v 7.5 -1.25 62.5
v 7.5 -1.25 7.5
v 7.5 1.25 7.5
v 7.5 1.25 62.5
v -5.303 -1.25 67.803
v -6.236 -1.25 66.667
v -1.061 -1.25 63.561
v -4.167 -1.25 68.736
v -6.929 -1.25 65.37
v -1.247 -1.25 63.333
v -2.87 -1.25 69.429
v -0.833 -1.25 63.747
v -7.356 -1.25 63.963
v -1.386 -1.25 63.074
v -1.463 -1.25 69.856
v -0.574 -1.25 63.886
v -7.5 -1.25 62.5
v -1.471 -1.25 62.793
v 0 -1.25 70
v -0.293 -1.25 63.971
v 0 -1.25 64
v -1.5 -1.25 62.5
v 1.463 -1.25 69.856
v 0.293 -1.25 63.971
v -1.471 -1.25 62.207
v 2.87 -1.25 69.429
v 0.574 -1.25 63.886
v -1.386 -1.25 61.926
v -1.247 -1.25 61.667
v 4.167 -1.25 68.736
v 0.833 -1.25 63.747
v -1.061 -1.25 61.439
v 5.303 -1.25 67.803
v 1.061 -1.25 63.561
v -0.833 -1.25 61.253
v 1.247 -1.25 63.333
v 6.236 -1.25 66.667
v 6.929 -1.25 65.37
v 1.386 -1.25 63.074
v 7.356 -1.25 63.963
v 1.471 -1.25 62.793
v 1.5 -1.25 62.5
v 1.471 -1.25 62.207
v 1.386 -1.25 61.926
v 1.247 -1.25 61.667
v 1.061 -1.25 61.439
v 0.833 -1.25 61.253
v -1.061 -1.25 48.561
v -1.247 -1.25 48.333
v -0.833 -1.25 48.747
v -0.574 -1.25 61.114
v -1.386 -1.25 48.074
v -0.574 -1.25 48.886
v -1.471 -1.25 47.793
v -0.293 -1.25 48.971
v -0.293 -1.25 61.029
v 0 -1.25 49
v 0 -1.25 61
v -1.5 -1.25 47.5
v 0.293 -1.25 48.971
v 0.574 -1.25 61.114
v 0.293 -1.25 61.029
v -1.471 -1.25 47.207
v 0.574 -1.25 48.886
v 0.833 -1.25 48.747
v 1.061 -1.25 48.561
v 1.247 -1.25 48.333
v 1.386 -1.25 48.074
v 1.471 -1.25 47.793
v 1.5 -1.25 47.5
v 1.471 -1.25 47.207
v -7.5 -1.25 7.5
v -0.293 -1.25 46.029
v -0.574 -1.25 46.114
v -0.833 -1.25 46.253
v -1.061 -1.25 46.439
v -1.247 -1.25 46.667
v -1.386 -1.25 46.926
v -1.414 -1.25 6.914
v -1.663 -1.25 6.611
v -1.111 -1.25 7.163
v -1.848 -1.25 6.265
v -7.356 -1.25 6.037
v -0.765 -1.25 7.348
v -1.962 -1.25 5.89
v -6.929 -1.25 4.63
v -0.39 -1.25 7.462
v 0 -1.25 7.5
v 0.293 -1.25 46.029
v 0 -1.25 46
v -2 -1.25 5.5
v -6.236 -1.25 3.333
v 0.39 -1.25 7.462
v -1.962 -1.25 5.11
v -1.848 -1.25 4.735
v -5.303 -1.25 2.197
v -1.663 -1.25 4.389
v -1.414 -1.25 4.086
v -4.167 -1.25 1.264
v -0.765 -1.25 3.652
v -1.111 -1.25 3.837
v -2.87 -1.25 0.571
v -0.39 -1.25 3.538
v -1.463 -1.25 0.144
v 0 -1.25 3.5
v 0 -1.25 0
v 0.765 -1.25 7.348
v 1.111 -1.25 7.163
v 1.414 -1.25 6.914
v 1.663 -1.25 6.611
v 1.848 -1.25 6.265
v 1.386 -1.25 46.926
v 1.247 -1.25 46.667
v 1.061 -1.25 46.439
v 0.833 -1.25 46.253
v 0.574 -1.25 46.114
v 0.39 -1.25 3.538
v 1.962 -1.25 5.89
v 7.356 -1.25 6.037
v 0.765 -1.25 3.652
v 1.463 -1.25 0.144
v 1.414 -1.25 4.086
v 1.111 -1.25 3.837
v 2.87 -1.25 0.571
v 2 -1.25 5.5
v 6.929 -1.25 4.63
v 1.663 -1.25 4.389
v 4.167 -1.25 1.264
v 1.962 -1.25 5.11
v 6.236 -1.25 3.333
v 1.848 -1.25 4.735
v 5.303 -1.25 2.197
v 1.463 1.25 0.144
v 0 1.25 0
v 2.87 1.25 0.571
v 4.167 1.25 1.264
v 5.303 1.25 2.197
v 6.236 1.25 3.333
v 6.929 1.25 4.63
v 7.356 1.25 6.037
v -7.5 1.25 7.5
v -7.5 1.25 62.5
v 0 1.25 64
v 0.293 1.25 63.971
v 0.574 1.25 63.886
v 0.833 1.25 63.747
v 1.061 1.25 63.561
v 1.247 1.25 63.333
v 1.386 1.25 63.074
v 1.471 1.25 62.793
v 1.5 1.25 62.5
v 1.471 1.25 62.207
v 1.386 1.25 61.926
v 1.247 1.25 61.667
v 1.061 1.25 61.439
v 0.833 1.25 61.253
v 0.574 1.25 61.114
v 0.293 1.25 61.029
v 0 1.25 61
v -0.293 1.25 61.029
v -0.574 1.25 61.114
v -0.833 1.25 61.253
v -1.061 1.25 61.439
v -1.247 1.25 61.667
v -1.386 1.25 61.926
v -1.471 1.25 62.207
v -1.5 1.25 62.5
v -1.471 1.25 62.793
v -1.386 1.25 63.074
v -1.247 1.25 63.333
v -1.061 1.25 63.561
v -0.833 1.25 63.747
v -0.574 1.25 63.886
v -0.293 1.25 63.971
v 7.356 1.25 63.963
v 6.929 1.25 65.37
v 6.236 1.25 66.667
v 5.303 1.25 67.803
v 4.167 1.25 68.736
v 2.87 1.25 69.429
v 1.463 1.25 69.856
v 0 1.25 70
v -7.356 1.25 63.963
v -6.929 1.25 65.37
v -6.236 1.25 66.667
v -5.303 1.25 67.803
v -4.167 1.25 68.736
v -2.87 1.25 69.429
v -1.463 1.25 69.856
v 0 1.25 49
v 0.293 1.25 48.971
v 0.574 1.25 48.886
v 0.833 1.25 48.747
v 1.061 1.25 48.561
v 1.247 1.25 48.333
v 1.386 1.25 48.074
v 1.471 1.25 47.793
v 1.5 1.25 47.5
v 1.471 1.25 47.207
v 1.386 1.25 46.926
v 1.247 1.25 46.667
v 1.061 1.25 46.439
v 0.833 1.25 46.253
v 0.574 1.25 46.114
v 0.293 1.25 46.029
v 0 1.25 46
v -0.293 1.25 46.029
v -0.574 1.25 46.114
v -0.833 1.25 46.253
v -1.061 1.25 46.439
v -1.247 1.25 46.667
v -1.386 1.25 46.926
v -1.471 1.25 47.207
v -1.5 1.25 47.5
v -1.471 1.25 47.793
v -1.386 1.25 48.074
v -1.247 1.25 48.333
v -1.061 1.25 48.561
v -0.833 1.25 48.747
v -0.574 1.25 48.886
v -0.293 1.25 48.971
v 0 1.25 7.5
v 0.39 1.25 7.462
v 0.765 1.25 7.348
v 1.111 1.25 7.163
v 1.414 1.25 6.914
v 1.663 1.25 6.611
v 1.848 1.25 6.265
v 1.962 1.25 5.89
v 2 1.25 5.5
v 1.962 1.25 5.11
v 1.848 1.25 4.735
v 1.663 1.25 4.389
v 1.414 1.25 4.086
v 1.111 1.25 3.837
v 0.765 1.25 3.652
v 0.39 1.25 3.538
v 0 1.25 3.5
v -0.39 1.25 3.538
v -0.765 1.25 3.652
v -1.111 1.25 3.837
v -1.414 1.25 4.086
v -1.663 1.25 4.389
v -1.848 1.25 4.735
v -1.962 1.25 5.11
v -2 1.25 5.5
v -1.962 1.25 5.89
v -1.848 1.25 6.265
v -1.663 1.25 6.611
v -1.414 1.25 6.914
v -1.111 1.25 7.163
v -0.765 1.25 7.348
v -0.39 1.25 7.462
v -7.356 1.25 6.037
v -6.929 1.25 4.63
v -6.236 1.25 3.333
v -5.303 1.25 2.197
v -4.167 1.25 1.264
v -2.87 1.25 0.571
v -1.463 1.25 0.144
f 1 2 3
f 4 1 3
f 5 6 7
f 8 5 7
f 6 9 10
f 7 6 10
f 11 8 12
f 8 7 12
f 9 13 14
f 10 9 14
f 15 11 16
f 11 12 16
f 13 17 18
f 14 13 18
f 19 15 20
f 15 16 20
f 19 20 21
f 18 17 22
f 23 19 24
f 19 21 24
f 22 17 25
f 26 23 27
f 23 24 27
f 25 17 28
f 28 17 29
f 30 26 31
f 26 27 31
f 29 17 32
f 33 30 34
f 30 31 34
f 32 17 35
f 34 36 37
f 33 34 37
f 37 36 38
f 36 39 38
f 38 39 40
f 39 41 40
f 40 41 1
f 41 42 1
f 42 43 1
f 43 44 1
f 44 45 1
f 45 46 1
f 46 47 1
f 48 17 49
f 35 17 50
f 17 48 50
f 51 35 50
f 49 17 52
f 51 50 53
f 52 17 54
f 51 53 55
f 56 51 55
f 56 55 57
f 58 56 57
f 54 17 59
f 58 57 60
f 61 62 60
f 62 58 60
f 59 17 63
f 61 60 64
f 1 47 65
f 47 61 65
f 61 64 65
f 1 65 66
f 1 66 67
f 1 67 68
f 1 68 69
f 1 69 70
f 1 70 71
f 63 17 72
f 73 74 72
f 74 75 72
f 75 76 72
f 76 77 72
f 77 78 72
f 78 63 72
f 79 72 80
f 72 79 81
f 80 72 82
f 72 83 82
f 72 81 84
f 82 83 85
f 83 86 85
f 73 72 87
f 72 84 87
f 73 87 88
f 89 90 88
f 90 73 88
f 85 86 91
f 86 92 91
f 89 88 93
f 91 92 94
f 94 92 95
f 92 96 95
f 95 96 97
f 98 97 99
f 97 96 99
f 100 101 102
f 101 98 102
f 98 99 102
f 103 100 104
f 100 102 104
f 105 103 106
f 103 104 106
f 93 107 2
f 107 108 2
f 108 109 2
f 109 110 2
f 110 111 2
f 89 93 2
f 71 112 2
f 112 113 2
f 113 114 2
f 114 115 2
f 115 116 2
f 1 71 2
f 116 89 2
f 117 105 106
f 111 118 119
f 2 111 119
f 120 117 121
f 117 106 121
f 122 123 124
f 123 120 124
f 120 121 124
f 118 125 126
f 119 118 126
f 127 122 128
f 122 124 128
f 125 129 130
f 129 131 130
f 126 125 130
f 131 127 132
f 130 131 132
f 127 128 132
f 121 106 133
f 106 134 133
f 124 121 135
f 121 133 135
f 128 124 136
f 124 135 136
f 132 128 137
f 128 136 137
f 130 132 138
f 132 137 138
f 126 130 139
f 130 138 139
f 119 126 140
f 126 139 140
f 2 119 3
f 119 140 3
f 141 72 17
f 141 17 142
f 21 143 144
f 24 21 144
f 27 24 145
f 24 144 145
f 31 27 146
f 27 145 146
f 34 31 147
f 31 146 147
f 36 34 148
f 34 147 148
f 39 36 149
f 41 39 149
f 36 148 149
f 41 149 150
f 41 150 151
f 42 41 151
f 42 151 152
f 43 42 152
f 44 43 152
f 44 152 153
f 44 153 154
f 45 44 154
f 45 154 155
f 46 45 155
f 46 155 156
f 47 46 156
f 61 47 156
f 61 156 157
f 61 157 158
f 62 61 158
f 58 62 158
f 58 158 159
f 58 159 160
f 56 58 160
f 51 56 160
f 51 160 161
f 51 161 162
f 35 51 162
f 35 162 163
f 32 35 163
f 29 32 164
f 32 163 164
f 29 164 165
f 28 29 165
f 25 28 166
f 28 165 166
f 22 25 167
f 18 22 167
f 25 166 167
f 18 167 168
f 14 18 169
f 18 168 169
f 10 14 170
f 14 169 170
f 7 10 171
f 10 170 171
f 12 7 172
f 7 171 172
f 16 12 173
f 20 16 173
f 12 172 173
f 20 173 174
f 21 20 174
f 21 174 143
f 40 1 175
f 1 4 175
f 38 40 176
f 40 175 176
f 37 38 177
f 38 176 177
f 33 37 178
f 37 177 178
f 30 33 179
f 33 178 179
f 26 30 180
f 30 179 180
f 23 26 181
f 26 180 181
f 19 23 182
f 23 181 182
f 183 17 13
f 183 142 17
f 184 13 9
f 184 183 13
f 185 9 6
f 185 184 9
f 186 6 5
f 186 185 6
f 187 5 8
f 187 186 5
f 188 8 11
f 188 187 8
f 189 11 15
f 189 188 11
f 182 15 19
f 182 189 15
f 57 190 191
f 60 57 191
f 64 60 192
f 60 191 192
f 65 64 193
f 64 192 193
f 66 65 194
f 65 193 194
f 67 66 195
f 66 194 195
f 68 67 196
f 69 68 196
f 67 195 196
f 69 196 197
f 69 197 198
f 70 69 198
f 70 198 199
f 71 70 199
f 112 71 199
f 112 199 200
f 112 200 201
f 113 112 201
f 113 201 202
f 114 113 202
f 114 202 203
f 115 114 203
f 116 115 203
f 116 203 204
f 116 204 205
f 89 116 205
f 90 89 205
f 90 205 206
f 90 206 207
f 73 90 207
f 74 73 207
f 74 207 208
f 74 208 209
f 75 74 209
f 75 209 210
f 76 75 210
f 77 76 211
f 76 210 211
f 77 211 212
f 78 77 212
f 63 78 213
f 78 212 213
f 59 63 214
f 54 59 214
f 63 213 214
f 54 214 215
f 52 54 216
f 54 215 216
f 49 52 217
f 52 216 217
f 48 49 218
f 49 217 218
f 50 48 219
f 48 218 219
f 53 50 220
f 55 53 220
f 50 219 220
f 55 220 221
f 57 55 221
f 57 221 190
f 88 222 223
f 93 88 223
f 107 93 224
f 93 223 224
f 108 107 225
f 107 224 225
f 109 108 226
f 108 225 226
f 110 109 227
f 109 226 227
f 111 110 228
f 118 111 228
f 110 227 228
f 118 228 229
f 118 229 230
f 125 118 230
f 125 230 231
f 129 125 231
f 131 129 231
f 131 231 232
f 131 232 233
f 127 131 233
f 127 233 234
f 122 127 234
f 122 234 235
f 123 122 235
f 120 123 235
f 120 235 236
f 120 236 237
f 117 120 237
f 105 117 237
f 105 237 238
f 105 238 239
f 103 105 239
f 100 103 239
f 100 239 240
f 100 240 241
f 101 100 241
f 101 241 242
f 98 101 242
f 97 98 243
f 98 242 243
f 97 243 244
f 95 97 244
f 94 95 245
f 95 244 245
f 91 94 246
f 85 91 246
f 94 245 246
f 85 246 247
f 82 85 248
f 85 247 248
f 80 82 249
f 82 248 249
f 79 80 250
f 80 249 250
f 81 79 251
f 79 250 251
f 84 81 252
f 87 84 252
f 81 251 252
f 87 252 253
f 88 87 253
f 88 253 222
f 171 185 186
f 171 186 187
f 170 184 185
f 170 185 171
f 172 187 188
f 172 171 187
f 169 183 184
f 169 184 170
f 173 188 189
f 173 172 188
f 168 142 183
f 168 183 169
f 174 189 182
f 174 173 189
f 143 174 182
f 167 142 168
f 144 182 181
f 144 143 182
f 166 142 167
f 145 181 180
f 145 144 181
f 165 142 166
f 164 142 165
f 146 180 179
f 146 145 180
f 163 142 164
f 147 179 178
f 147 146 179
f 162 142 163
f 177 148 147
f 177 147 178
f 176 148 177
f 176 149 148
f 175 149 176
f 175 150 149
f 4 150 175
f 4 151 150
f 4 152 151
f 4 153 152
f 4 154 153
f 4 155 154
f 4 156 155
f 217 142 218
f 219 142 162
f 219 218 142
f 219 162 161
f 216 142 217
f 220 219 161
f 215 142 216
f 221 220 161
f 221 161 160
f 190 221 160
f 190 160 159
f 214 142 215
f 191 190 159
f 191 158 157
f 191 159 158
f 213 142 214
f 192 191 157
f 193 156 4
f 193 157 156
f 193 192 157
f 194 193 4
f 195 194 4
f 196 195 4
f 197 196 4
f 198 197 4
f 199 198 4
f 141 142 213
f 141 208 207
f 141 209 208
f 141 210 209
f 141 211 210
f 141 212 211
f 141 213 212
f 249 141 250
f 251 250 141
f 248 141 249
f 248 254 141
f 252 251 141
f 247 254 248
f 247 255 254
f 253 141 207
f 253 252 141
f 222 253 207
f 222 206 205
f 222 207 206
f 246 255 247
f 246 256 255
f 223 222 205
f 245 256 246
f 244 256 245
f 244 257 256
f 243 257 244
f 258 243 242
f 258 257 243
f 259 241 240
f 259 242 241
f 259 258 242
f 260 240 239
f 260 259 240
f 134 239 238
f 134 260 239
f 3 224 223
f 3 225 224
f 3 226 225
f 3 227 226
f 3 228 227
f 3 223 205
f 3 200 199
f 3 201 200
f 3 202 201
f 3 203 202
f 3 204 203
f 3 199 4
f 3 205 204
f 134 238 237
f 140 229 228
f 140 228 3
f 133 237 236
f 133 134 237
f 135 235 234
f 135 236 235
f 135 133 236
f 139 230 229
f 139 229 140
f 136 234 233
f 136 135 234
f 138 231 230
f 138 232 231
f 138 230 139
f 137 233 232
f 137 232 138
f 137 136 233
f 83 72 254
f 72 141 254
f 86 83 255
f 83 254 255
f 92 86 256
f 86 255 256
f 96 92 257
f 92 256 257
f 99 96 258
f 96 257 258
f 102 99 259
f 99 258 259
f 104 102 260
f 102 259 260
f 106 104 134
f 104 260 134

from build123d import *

# Parameters (mm, degrees)
ESQUISSE1_W      = 15
ESQUISSE1_H      = 2.5
EXTRUSION1_DEPTH = 70
CONG_1_R         = 7.5
ESQUISSE2_R      = 1.5
EXTRUSION2_DEPTH = 71.445014018
ESQUISSE3_R      = 2
EXTRUSION3_DEPTH = 71.445014018
CONG_2_R         = 7.5
ESQUISSE4_R      = 1.5
EXTRUSION4_DEPTH = 71.445014018


with BuildPart() as part:
    # Esquisse1 → Extrusion1 (new body)
    with BuildSketch(Plane.XY):
        Rectangle(ESQUISSE1_W, ESQUISSE1_H)
    extrude(amount=EXTRUSION1_DEPTH)

    # Congé1
    cong_1_edges = [part.edges().sort_by_distance(p)[0] for p in [
        (-7.5, 0, 70),
        (7.5, 0, 70),
    ]]
    fillet(cong_1_edges, radius=CONG_1_R - 0.0001)  # a hair under: the kernel refuses the full size

    # Esquisse2 → Extrusion2 (cut, through all)
    with BuildSketch(Plane(origin=(0, 1.25, 0), x_dir=(1, 0, 0), z_dir=(0, 1, 0))):
        with Locations(Location((0, -62.5, 0), (0, 0, 270))):
            Circle(ESQUISSE2_R)
    extrude(amount=-EXTRUSION2_DEPTH, mode=Mode.SUBTRACT)

    # Esquisse3 → Extrusion3 (cut, through all)
    with BuildSketch(Plane(origin=(0, 1.25, 0), x_dir=(1, 0, 0), z_dir=(0, 1, 0))):
        with Locations(Location((0, -5.5, 0), (0, 0, 270))):
            Circle(ESQUISSE3_R)
    extrude(amount=-EXTRUSION3_DEPTH, mode=Mode.SUBTRACT)

    # Congé2
    cong_2_edges = [part.edges().sort_by_distance(p)[0] for p in [
        (7.5, 0, 0),
        (-7.5, 0, 0),
    ]]
    fillet(cong_2_edges, radius=CONG_2_R - 0.0001)  # a hair under: the kernel refuses the full size

    # Esquisse4 → Extrusion4 (cut, through all)
    with BuildSketch(Plane(origin=(0, 1.25, 0), x_dir=(1, 0, 0), z_dir=(0, 1, 0))):
        with Locations(Location((0, -47.5, 0), (0, 0, 270))):
            Circle(ESQUISSE4_R)
    extrude(amount=-EXTRUSION4_DEPTH, mode=Mode.SUBTRACT)


solid = part.part
